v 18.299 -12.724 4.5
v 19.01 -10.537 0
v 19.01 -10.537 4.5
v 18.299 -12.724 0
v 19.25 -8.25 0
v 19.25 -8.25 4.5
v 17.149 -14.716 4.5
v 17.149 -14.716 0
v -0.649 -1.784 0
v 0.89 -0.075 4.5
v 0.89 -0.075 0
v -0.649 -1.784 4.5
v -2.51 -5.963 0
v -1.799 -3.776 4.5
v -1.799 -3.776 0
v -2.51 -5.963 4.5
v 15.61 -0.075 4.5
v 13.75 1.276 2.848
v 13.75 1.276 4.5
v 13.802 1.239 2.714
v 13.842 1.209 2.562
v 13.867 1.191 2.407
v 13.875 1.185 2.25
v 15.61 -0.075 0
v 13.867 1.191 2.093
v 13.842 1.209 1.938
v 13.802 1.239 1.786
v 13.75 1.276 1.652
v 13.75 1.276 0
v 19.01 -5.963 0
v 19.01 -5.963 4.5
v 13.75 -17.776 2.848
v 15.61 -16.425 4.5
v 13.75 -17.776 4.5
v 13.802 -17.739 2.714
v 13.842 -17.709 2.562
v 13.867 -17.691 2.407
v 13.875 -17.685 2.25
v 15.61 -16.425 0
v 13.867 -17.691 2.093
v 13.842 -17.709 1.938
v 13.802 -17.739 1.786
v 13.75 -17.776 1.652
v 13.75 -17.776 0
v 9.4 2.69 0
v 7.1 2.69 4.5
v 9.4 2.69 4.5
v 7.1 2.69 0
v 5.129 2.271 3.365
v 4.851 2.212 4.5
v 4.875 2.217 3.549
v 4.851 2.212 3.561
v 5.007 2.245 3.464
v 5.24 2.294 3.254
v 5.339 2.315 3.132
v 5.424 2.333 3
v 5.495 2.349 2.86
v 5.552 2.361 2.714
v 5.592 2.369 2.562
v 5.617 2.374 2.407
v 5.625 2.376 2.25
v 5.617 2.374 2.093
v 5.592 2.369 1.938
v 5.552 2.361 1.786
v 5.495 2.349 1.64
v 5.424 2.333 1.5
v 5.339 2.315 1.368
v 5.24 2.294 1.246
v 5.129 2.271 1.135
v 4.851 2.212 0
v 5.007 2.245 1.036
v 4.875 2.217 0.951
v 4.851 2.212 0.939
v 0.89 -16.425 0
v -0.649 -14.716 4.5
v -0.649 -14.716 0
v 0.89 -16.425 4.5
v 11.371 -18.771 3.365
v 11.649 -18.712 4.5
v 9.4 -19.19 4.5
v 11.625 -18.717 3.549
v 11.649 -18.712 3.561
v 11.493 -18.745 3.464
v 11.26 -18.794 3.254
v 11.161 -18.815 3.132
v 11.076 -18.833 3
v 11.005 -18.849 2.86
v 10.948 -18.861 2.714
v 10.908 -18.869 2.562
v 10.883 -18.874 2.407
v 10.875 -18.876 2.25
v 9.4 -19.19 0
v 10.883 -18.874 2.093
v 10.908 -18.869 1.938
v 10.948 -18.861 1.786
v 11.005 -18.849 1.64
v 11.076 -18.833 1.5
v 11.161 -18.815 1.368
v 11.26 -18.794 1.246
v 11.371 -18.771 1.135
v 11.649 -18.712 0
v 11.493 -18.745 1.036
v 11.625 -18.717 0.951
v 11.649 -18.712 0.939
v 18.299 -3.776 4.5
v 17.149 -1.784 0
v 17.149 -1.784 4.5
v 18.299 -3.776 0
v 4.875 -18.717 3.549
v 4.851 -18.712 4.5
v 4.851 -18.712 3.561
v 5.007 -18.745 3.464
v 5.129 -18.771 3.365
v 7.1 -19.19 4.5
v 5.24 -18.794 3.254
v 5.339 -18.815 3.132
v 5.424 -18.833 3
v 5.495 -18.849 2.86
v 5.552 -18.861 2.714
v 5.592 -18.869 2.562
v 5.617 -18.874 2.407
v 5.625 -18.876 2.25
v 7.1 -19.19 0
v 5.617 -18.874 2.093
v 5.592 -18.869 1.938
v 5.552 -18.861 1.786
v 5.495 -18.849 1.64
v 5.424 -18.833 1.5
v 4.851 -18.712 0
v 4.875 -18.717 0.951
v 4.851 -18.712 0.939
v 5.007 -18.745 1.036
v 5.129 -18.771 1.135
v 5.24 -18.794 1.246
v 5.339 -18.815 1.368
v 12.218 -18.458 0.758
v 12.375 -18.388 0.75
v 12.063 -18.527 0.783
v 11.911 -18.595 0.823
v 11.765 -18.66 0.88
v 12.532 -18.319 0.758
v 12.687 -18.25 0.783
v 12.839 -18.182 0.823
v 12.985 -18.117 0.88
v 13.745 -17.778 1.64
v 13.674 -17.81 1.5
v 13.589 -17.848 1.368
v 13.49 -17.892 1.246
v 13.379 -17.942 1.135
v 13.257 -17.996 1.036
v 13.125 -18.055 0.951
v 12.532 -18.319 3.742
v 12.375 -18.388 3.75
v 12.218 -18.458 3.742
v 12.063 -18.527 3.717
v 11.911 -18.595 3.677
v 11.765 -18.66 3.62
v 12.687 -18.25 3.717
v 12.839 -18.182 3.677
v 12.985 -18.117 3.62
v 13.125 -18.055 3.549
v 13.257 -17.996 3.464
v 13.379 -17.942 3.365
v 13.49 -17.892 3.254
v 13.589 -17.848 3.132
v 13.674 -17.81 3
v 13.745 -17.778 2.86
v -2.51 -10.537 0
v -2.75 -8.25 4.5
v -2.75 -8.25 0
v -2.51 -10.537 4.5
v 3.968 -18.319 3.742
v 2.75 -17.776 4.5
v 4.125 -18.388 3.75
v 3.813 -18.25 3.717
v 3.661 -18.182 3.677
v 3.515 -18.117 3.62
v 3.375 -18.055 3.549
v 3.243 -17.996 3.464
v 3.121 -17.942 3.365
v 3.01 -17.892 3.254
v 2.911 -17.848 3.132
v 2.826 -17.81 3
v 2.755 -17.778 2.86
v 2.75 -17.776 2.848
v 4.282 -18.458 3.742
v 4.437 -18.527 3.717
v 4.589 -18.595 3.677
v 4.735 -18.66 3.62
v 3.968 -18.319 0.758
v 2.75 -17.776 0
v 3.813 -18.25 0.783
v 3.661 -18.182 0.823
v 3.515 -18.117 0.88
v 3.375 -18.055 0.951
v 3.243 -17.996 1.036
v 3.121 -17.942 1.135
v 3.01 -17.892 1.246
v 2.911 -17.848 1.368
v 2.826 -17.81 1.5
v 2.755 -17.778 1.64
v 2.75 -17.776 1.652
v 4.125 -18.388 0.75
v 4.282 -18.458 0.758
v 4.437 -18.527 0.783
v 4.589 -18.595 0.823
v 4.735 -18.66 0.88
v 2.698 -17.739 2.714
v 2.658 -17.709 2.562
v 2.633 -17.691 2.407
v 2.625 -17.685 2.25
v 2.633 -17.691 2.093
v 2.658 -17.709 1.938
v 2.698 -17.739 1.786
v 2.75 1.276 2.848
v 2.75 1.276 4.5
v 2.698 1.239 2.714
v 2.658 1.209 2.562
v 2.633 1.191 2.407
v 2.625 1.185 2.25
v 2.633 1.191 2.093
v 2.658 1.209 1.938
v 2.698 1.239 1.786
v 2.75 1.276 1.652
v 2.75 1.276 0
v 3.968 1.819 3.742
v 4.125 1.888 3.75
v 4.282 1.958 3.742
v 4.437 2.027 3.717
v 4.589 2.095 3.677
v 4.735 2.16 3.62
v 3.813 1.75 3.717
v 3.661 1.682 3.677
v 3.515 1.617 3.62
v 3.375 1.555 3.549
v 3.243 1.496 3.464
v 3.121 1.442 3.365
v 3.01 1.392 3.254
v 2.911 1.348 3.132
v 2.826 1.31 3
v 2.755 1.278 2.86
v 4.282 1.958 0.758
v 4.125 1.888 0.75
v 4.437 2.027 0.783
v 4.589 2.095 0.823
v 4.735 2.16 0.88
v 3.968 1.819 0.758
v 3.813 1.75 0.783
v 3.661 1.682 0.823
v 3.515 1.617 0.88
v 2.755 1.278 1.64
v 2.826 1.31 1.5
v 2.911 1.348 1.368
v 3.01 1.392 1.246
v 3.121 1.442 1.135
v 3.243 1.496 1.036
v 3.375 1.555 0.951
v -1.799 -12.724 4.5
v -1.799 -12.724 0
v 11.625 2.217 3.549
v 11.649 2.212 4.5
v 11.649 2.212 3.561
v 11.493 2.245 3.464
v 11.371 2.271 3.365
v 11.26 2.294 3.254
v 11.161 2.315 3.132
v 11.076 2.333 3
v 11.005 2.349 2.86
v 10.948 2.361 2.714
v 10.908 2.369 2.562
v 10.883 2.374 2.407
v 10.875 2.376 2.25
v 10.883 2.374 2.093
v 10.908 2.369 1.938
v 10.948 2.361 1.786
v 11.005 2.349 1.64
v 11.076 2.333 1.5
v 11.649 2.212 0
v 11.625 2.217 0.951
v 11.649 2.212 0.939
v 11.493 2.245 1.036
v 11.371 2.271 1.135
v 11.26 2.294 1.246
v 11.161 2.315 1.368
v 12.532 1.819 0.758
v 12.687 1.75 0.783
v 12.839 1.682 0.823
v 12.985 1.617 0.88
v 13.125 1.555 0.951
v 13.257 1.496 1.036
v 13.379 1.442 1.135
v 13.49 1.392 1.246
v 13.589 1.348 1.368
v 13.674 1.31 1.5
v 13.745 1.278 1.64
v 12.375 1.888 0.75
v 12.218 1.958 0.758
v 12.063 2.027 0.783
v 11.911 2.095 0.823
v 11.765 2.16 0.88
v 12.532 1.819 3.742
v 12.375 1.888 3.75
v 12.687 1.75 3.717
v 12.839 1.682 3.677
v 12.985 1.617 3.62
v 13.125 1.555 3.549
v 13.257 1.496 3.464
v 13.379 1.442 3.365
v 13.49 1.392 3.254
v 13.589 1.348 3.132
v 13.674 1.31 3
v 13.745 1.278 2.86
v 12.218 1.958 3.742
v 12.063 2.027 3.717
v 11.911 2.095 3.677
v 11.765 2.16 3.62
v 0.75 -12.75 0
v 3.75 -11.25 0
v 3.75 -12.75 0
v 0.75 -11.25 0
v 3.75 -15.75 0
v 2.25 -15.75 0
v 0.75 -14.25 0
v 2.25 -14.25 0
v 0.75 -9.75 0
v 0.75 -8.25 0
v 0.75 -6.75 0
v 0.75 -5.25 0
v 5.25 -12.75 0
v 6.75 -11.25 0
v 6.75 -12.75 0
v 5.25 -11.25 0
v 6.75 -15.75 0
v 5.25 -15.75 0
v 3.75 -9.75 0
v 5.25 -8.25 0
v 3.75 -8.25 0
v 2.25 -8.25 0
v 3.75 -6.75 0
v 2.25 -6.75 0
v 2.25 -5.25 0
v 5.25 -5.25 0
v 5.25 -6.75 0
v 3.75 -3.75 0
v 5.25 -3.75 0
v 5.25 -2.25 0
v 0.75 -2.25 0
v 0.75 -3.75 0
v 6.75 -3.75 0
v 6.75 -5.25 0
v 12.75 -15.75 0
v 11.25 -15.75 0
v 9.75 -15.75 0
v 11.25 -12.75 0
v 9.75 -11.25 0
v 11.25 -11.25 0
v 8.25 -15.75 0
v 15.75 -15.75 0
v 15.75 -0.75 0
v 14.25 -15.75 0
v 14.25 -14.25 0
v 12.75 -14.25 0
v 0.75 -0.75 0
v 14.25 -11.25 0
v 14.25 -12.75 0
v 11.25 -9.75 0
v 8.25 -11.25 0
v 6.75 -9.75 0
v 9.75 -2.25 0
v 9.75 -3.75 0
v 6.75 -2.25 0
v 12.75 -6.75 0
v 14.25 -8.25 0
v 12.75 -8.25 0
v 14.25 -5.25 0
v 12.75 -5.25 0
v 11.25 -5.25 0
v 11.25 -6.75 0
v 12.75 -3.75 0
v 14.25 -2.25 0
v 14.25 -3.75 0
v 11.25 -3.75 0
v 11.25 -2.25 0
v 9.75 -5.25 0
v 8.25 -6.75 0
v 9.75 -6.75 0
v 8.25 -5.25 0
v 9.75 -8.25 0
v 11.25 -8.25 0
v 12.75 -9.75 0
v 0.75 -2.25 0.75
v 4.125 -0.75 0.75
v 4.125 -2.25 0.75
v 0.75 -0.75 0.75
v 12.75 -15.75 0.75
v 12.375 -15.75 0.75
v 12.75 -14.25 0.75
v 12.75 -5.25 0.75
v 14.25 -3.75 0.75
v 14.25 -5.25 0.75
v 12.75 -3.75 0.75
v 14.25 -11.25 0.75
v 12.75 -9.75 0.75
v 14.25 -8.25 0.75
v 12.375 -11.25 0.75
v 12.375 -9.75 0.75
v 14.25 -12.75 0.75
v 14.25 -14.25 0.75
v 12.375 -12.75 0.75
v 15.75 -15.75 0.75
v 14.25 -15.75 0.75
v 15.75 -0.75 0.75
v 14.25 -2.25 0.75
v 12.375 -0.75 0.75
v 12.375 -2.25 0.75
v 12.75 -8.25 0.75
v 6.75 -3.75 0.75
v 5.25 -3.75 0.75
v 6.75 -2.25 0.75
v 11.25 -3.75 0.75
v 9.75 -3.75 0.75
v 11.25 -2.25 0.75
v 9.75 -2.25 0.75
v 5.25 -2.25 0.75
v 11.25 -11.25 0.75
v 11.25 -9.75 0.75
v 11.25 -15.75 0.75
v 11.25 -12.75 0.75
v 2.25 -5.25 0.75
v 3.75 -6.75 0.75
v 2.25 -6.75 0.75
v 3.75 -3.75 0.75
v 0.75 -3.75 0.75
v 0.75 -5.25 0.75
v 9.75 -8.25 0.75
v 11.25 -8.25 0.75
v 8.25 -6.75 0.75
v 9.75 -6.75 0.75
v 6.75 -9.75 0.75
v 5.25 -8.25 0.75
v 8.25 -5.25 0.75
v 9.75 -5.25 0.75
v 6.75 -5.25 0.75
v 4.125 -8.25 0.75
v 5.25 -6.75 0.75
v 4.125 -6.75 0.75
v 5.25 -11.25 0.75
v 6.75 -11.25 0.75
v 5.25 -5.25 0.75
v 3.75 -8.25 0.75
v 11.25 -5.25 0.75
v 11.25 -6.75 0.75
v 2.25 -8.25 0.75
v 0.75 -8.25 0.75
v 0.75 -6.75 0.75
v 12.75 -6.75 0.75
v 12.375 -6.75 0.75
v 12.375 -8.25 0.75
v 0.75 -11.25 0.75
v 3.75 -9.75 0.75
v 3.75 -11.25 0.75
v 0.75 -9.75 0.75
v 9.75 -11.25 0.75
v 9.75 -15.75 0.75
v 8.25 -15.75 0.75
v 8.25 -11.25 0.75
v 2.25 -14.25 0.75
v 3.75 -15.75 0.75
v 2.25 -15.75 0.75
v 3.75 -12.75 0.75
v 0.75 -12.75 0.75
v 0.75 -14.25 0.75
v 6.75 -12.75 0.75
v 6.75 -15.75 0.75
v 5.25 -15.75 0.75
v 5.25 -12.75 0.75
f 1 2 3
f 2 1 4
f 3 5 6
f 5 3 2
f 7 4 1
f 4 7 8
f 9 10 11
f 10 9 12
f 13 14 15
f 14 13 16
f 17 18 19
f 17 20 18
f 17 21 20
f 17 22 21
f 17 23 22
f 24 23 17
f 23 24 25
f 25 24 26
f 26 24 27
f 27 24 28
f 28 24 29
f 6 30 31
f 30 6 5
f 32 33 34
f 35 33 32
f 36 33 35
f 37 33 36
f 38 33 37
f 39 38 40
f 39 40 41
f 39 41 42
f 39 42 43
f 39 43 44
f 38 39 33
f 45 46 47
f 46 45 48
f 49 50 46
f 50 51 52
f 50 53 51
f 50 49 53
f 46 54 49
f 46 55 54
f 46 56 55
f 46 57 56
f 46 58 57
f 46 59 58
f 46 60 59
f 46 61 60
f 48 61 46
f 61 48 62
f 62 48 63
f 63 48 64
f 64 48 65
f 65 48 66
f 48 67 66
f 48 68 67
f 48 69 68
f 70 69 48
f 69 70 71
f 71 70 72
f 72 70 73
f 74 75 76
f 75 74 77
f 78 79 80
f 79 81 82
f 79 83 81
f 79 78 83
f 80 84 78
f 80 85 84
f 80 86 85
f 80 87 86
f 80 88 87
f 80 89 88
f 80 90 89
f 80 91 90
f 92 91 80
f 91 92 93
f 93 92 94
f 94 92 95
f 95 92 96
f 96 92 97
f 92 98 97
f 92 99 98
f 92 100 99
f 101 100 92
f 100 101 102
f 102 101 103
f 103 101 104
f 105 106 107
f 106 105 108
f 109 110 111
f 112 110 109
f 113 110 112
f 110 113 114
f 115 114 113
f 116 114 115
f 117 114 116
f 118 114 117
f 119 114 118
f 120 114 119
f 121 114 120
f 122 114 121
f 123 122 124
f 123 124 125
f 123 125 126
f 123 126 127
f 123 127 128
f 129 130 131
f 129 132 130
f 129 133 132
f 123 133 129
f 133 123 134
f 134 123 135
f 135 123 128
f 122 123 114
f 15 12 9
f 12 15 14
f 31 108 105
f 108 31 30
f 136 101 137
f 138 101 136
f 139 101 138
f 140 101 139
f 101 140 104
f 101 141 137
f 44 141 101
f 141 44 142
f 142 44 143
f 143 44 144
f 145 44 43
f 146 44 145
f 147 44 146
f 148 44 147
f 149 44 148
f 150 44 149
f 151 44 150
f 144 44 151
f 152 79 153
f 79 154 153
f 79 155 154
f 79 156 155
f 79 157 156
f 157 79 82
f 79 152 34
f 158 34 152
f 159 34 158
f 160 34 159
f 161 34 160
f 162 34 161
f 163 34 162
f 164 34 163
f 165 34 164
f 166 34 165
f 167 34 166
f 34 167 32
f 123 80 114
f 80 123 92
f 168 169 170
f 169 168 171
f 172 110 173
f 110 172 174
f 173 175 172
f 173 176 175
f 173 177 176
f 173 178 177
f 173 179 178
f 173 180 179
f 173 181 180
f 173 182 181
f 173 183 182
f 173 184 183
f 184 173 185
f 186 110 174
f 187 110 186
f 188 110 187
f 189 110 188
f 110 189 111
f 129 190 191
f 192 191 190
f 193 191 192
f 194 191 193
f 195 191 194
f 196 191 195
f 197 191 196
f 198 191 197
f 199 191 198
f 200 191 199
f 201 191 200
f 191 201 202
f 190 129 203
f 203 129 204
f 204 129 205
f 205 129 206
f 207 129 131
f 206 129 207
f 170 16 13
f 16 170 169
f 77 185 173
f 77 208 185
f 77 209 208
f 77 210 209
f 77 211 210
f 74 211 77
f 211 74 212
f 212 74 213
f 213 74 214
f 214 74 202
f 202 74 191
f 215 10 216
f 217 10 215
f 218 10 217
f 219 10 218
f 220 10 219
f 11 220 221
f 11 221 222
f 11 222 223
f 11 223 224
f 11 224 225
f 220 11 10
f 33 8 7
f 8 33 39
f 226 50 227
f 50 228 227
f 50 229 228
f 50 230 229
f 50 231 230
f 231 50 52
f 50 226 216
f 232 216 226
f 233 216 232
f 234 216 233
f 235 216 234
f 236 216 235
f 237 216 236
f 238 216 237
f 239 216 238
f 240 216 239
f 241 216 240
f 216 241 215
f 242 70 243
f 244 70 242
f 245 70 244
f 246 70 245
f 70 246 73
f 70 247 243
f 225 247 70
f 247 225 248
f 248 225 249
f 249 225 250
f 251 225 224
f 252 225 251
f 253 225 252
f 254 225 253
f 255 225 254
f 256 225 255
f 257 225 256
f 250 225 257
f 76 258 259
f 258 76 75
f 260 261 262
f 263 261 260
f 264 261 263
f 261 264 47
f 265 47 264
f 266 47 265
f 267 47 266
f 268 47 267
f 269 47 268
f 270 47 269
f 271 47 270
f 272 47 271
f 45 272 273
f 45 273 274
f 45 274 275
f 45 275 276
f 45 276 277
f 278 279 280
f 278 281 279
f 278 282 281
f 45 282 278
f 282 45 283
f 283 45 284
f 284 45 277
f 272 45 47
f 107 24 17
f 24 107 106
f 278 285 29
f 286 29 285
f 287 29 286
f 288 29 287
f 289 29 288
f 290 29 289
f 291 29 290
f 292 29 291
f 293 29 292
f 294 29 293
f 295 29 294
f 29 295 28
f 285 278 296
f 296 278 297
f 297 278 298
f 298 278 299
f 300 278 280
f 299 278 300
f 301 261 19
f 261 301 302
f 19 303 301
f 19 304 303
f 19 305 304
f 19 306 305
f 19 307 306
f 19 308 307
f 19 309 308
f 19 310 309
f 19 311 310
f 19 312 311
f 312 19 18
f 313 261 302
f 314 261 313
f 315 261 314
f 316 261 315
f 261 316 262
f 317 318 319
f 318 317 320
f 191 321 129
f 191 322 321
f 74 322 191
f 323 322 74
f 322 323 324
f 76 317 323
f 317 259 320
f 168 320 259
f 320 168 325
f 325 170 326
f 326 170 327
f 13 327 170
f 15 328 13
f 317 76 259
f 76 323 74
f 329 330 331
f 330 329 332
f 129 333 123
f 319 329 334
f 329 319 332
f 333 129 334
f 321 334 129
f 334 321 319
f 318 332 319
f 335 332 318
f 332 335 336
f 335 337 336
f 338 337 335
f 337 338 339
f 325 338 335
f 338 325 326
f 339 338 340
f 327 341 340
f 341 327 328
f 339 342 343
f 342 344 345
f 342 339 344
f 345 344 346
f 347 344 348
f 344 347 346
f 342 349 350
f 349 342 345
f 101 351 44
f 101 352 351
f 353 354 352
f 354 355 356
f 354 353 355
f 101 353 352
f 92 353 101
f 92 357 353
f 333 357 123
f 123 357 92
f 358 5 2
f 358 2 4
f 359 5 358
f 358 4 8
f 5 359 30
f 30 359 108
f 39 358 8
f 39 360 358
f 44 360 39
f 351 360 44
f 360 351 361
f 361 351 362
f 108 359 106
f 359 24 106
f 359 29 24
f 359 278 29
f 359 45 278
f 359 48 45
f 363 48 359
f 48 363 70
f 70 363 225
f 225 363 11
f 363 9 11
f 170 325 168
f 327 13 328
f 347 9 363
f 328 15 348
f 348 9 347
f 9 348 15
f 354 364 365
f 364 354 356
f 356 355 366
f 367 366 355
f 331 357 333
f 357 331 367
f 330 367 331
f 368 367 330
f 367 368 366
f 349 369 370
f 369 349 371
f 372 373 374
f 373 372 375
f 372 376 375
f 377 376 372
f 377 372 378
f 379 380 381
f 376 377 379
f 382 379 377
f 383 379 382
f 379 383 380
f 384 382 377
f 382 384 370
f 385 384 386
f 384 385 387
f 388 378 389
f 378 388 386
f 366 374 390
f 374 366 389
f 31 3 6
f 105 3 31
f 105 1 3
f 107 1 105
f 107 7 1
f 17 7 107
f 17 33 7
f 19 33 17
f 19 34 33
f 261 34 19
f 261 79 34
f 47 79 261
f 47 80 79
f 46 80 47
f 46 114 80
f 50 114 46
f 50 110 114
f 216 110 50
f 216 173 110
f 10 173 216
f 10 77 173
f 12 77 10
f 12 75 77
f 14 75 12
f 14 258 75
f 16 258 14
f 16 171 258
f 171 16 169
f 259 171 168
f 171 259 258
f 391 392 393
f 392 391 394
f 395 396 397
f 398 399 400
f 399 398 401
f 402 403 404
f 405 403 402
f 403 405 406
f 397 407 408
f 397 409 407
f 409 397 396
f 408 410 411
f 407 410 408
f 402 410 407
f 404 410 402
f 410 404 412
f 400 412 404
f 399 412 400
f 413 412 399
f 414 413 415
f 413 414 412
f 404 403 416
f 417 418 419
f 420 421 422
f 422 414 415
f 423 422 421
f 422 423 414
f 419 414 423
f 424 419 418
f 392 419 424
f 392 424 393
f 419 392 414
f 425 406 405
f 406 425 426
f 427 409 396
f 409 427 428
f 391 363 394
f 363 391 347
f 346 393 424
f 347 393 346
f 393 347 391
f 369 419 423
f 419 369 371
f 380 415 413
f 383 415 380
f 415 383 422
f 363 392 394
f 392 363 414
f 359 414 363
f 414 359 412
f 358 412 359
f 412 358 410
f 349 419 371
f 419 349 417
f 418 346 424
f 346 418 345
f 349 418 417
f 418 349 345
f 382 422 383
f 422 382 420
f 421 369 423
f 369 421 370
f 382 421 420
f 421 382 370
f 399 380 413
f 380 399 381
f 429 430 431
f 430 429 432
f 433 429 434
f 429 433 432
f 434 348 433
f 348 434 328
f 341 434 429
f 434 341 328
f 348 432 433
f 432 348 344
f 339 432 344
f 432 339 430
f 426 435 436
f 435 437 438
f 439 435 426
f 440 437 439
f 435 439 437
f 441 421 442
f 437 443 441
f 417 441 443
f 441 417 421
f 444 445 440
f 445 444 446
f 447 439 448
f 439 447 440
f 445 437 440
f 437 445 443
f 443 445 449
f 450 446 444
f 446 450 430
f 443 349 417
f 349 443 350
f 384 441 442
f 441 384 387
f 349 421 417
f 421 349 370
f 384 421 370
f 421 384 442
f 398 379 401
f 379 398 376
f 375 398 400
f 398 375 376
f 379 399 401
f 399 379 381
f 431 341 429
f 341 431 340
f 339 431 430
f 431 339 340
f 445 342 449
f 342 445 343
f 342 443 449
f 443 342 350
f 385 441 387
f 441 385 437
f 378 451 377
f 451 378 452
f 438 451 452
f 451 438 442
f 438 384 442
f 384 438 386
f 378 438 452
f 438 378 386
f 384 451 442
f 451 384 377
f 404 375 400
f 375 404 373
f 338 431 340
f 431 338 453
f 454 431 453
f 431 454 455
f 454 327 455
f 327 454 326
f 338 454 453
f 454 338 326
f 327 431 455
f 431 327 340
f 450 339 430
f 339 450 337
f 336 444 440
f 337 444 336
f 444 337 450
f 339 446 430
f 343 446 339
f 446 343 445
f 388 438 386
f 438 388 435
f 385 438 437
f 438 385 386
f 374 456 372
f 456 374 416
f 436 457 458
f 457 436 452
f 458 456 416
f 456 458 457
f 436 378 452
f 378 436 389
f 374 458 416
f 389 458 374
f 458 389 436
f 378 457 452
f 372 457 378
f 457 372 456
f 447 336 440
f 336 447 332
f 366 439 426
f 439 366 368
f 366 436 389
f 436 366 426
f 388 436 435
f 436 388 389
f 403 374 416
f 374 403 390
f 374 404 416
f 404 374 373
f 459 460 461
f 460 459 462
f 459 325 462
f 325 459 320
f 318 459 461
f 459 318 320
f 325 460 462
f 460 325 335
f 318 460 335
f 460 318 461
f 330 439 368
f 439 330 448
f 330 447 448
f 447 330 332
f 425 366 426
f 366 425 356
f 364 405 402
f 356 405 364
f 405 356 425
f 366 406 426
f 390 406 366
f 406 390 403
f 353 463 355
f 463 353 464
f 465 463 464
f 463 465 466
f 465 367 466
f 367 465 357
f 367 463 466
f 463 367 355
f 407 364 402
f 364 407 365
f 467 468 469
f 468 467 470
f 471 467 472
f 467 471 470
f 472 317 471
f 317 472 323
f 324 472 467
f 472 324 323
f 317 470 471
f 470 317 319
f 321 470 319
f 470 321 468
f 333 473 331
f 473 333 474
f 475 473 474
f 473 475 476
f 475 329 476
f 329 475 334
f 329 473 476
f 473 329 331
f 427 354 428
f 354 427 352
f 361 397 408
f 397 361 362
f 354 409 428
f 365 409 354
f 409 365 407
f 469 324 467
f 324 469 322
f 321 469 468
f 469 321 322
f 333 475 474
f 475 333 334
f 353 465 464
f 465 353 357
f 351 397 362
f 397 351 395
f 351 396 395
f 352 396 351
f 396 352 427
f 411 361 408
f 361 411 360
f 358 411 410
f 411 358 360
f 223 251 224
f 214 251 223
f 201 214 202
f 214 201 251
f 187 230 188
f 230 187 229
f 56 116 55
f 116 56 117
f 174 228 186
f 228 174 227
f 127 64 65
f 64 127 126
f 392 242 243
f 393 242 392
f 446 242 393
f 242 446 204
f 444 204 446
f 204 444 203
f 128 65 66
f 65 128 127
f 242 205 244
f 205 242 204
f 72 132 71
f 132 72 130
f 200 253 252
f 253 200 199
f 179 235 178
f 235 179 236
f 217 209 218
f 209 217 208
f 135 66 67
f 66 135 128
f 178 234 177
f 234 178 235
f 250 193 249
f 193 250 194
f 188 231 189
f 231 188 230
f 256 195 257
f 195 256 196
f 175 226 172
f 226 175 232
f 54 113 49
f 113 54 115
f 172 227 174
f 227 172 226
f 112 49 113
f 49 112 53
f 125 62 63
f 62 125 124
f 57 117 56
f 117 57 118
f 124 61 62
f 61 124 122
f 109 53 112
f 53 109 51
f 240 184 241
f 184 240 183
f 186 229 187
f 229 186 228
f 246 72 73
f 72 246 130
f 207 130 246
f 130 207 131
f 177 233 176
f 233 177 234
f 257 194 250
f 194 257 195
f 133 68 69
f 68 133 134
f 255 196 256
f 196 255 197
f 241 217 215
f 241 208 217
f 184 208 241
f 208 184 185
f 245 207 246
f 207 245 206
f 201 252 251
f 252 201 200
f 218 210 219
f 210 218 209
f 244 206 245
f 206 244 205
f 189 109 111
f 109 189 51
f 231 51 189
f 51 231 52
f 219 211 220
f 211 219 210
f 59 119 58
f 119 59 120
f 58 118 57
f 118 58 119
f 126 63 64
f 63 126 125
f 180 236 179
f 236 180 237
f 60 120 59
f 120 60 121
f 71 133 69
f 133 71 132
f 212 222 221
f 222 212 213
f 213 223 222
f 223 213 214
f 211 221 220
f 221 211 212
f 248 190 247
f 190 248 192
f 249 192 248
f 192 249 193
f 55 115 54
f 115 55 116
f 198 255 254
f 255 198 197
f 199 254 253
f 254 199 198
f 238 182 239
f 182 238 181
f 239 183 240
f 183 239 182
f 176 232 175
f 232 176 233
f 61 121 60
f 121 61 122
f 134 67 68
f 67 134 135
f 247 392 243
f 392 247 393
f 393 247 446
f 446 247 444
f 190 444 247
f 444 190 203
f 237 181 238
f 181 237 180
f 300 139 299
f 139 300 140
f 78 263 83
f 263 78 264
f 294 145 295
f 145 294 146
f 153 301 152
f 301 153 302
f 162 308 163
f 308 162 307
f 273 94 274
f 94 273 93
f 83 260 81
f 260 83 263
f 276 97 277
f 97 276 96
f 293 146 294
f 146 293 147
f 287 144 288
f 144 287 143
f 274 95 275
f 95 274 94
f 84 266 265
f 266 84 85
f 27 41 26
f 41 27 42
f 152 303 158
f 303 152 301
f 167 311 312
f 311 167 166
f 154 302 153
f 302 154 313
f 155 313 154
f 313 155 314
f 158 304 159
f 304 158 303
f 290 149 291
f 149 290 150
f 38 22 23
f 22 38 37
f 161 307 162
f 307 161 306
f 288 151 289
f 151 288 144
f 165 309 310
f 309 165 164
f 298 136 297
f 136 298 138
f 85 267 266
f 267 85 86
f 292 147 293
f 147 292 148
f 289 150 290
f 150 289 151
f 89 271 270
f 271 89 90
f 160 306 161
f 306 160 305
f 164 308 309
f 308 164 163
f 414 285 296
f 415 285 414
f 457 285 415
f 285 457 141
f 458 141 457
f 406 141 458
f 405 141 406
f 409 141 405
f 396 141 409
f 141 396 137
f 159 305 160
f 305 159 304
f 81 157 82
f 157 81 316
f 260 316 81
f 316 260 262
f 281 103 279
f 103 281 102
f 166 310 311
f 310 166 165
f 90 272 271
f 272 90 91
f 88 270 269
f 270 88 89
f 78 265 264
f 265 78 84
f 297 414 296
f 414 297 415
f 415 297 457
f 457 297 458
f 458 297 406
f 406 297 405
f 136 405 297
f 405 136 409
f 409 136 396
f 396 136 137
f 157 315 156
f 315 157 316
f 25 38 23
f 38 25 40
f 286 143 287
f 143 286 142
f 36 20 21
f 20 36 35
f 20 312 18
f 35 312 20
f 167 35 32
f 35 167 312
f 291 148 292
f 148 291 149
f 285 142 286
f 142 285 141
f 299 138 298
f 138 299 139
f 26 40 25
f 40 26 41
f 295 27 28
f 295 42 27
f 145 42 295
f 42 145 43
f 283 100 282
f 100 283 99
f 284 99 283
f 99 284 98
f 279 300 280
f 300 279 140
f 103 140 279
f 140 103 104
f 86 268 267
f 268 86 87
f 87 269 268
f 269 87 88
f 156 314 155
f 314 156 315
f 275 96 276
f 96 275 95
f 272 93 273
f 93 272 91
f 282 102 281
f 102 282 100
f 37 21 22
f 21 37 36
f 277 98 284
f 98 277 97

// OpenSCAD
rotate([180,0,0])difference(){translate([8.25,8.25,-2.25])  cylinder(r=11,h=4.5, center=true);
translate([1.5,1.5,0])  cube(size = [1.5,1.5,1.5], center=true);
translate([3,1.5,0])  cube(size = [1.5,1.5,1.5], center=true);
translate([4.5,1.5,0])  cube(size = [1.5,1.5,1.5], center=true);
translate([6,1.5,0])  cube(size = [1.5,1.5,1.5], center=true);
translate([7.5,1.5,0])  cube(size = [1.5,1.5,1.5], center=true);
translate([9,1.5,0])  cube(size = [1.5,1.5,1.5], center=true);
translate([10.5,1.5,0])  cube(size = [1.5,1.5,1.5], center=true);
translate([12,1.5,0])  cube(size = [1.5,1.5,1.5], center=true);
translate([13.5,1.5,0])  cube(size = [1.5,1.5,1.5], center=true);
translate([15,1.5,0])  cube(size = [1.5,1.5,1.5], center=true);
translate([15,1.5,0])  cube(size = [1.5,1.5,1.5], center=true);
translate([15,1.5,0])  cube(size = [1.5,1.5,1.5], center=true);
translate([15,1.5,0])  cube(size = [1.5,1.5,1.5], center=true);
translate([6,3,0])  cube(size = [1.5,1.5,1.5], center=true);
translate([6,3,0])  cube(size = [1.5,1.5,1.5], center=true);
translate([6,3,0])  cube(size = [1.5,1.5,1.5], center=true);
translate([10.5,3,0])  cube(size = [1.5,1.5,1.5], center=true);
translate([10.5,3,0])  cube(size = [1.5,1.5,1.5], center=true);
translate([10.5,3,0])  cube(size = [1.5,1.5,1.5], center=true);
translate([15,3,0])  cube(size = [1.5,1.5,1.5], center=true);
translate([1.5,4.5,0])  cube(size = [1.5,1.5,1.5], center=true);
translate([3,4.5,0])  cube(size = [1.5,1.5,1.5], center=true);
translate([3,4.5,0])  cube(size = [1.5,1.5,1.5], center=true);
translate([3,4.5,0])  cube(size = [1.5,1.5,1.5], center=true);
translate([7.5,4.5,0])  cube(size = [1.5,1.5,1.5], center=true);
translate([9,4.5,0])  cube(size = [1.5,1.5,1.5], center=true);
translate([9,4.5,0])  cube(size = [1.5,1.5,1.5], center=true);
translate([9,4.5,0])  cube(size = [1.5,1.5,1.5], center=true);
translate([13.5,4.5,0])  cube(size = [1.5,1.5,1.5], center=true);
translate([15,4.5,0])  cube(size = [1.5,1.5,1.5], center=true);
translate([15,4.5,0])  cube(size = [1.5,1.5,1.5], center=true);
translate([3,6,0])  cube(size = [1.5,1.5,1.5], center=true);
translate([3,6,0])  cube(size = [1.5,1.5,1.5], center=true);
translate([6,6,0])  cube(size = [1.5,1.5,1.5], center=true);
translate([7.5,6,0])  cube(size = [1.5,1.5,1.5], center=true);
translate([7.5,6,0])  cube(size = [1.5,1.5,1.5], center=true);
translate([10.5,6,0])  cube(size = [1.5,1.5,1.5], center=true);
translate([10.5,6,0])  cube(size = [1.5,1.5,1.5], center=true);
translate([10.5,6,0])  cube(size = [1.5,1.5,1.5], center=true);
translate([15,6,0])  cube(size = [1.5,1.5,1.5], center=true);
translate([1.5,7.5,0])  cube(size = [1.5,1.5,1.5], center=true);
translate([1.5,7.5,0])  cube(size = [1.5,1.5,1.5], center=true);
translate([4.5,7.5,0])  cube(size = [1.5,1.5,1.5], center=true);
translate([6,7.5,0])  cube(size = [1.5,1.5,1.5], center=true);
translate([7.5,7.5,0])  cube(size = [1.5,1.5,1.5], center=true);
translate([9,7.5,0])  cube(size = [1.5,1.5,1.5], center=true);
translate([9,7.5,0])  cube(size = [1.5,1.5,1.5], center=true);
translate([12,7.5,0])  cube(size = [1.5,1.5,1.5], center=true);
translate([12,7.5,0])  cube(size = [1.5,1.5,1.5], center=true);
translate([15,7.5,0])  cube(size = [1.5,1.5,1.5], center=true);
translate([15,7.5,0])  cube(size = [1.5,1.5,1.5], center=true);
translate([15,7.5,0])  cube(size = [1.5,1.5,1.5], center=true);
translate([15,7.5,0])  cube(size = [1.5,1.5,1.5], center=true);
translate([6,9,0])  cube(size = [1.5,1.5,1.5], center=true);
translate([7.5,9,0])  cube(size = [1.5,1.5,1.5], center=true);
translate([9,9,0])  cube(size = [1.5,1.5,1.5], center=true);
translate([10.5,9,0])  cube(size = [1.5,1.5,1.5], center=true);
translate([10.5,9,0])  cube(size = [1.5,1.5,1.5], center=true);
translate([13.5,9,0])  cube(size = [1.5,1.5,1.5], center=true);
translate([15,9,0])  cube(size = [1.5,1.5,1.5], center=true);
translate([1.5,10.5,0])  cube(size = [1.5,1.5,1.5], center=true);
translate([3,10.5,0])  cube(size = [1.5,1.5,1.5], center=true);
translate([3,10.5,0])  cube(size = [1.5,1.5,1.5], center=true);
translate([6,10.5,0])  cube(size = [1.5,1.5,1.5], center=true);
translate([6,10.5,0])  cube(size = [1.5,1.5,1.5], center=true);
translate([6,10.5,0])  cube(size = [1.5,1.5,1.5], center=true);
translate([6,10.5,0])  cube(size = [1.5,1.5,1.5], center=true);
translate([12,10.5,0])  cube(size = [1.5,1.5,1.5], center=true);
translate([13.5,10.5,0])  cube(size = [1.5,1.5,1.5], center=true);
translate([15,10.5,0])  cube(size = [1.5,1.5,1.5], center=true);
translate([15,10.5,0])  cube(size = [1.5,1.5,1.5], center=true);
translate([15,10.5,0])  cube(size = [1.5,1.5,1.5], center=true);
translate([15,10.5,0])  cube(size = [1.5,1.5,1.5], center=true);
translate([15,10.5,0])  cube(size = [1.5,1.5,1.5], center=true);
translate([15,10.5,0])  cube(size = [1.5,1.5,1.5], center=true);
translate([9,12,0])  cube(size = [1.5,1.5,1.5], center=true);
translate([9,12,0])  cube(size = [1.5,1.5,1.5], center=true);
translate([9,12,0])  cube(size = [1.5,1.5,1.5], center=true);
translate([9,12,0])  cube(size = [1.5,1.5,1.5], center=true);
translate([15,12,0])  cube(size = [1.5,1.5,1.5], center=true);
translate([1.5,13.5,0])  cube(size = [1.5,1.5,1.5], center=true);
translate([3,13.5,0])  cube(size = [1.5,1.5,1.5], center=true);
translate([3,13.5,0])  cube(size = [1.5,1.5,1.5], center=true);
translate([6,13.5,0])  cube(size = [1.5,1.5,1.5], center=true);
translate([6,13.5,0])  cube(size = [1.5,1.5,1.5], center=true);
translate([9,13.5,0])  cube(size = [1.5,1.5,1.5], center=true);
translate([9,13.5,0])  cube(size = [1.5,1.5,1.5], center=true);
translate([12,13.5,0])  cube(size = [1.5,1.5,1.5], center=true);
translate([13.5,13.5,0])  cube(size = [1.5,1.5,1.5], center=true);
translate([15,13.5,0])  cube(size = [1.5,1.5,1.5], center=true);
translate([15,13.5,0])  cube(size = [1.5,1.5,1.5], center=true);
translate([3,15,0])  cube(size = [1.5,1.5,1.5], center=true);
translate([3,15,0])  cube(size = [1.5,1.5,1.5], center=true);
translate([6,15,0])  cube(size = [1.5,1.5,1.5], center=true);
translate([6,15,0])  cube(size = [1.5,1.5,1.5], center=true);
translate([9,15,0])  cube(size = [1.5,1.5,1.5], center=true);
translate([9,15,0])  cube(size = [1.5,1.5,1.5], center=true);
translate([12,15,0])  cube(size = [1.5,1.5,1.5], center=true);
translate([12,15,0])  cube(size = [1.5,1.5,1.5], center=true);
translate([15,15,0])  cube(size = [1.5,1.5,1.5], center=true);
rotate([90,90,0])translate([2.25,4.125,0])  cylinder(r=1.5,h=400, $fn=60, center=true);
rotate([90,90,0])translate([2.25,12.375,0])  cylinder(r=1.5,h=400, $fn=60, center=true);
}
